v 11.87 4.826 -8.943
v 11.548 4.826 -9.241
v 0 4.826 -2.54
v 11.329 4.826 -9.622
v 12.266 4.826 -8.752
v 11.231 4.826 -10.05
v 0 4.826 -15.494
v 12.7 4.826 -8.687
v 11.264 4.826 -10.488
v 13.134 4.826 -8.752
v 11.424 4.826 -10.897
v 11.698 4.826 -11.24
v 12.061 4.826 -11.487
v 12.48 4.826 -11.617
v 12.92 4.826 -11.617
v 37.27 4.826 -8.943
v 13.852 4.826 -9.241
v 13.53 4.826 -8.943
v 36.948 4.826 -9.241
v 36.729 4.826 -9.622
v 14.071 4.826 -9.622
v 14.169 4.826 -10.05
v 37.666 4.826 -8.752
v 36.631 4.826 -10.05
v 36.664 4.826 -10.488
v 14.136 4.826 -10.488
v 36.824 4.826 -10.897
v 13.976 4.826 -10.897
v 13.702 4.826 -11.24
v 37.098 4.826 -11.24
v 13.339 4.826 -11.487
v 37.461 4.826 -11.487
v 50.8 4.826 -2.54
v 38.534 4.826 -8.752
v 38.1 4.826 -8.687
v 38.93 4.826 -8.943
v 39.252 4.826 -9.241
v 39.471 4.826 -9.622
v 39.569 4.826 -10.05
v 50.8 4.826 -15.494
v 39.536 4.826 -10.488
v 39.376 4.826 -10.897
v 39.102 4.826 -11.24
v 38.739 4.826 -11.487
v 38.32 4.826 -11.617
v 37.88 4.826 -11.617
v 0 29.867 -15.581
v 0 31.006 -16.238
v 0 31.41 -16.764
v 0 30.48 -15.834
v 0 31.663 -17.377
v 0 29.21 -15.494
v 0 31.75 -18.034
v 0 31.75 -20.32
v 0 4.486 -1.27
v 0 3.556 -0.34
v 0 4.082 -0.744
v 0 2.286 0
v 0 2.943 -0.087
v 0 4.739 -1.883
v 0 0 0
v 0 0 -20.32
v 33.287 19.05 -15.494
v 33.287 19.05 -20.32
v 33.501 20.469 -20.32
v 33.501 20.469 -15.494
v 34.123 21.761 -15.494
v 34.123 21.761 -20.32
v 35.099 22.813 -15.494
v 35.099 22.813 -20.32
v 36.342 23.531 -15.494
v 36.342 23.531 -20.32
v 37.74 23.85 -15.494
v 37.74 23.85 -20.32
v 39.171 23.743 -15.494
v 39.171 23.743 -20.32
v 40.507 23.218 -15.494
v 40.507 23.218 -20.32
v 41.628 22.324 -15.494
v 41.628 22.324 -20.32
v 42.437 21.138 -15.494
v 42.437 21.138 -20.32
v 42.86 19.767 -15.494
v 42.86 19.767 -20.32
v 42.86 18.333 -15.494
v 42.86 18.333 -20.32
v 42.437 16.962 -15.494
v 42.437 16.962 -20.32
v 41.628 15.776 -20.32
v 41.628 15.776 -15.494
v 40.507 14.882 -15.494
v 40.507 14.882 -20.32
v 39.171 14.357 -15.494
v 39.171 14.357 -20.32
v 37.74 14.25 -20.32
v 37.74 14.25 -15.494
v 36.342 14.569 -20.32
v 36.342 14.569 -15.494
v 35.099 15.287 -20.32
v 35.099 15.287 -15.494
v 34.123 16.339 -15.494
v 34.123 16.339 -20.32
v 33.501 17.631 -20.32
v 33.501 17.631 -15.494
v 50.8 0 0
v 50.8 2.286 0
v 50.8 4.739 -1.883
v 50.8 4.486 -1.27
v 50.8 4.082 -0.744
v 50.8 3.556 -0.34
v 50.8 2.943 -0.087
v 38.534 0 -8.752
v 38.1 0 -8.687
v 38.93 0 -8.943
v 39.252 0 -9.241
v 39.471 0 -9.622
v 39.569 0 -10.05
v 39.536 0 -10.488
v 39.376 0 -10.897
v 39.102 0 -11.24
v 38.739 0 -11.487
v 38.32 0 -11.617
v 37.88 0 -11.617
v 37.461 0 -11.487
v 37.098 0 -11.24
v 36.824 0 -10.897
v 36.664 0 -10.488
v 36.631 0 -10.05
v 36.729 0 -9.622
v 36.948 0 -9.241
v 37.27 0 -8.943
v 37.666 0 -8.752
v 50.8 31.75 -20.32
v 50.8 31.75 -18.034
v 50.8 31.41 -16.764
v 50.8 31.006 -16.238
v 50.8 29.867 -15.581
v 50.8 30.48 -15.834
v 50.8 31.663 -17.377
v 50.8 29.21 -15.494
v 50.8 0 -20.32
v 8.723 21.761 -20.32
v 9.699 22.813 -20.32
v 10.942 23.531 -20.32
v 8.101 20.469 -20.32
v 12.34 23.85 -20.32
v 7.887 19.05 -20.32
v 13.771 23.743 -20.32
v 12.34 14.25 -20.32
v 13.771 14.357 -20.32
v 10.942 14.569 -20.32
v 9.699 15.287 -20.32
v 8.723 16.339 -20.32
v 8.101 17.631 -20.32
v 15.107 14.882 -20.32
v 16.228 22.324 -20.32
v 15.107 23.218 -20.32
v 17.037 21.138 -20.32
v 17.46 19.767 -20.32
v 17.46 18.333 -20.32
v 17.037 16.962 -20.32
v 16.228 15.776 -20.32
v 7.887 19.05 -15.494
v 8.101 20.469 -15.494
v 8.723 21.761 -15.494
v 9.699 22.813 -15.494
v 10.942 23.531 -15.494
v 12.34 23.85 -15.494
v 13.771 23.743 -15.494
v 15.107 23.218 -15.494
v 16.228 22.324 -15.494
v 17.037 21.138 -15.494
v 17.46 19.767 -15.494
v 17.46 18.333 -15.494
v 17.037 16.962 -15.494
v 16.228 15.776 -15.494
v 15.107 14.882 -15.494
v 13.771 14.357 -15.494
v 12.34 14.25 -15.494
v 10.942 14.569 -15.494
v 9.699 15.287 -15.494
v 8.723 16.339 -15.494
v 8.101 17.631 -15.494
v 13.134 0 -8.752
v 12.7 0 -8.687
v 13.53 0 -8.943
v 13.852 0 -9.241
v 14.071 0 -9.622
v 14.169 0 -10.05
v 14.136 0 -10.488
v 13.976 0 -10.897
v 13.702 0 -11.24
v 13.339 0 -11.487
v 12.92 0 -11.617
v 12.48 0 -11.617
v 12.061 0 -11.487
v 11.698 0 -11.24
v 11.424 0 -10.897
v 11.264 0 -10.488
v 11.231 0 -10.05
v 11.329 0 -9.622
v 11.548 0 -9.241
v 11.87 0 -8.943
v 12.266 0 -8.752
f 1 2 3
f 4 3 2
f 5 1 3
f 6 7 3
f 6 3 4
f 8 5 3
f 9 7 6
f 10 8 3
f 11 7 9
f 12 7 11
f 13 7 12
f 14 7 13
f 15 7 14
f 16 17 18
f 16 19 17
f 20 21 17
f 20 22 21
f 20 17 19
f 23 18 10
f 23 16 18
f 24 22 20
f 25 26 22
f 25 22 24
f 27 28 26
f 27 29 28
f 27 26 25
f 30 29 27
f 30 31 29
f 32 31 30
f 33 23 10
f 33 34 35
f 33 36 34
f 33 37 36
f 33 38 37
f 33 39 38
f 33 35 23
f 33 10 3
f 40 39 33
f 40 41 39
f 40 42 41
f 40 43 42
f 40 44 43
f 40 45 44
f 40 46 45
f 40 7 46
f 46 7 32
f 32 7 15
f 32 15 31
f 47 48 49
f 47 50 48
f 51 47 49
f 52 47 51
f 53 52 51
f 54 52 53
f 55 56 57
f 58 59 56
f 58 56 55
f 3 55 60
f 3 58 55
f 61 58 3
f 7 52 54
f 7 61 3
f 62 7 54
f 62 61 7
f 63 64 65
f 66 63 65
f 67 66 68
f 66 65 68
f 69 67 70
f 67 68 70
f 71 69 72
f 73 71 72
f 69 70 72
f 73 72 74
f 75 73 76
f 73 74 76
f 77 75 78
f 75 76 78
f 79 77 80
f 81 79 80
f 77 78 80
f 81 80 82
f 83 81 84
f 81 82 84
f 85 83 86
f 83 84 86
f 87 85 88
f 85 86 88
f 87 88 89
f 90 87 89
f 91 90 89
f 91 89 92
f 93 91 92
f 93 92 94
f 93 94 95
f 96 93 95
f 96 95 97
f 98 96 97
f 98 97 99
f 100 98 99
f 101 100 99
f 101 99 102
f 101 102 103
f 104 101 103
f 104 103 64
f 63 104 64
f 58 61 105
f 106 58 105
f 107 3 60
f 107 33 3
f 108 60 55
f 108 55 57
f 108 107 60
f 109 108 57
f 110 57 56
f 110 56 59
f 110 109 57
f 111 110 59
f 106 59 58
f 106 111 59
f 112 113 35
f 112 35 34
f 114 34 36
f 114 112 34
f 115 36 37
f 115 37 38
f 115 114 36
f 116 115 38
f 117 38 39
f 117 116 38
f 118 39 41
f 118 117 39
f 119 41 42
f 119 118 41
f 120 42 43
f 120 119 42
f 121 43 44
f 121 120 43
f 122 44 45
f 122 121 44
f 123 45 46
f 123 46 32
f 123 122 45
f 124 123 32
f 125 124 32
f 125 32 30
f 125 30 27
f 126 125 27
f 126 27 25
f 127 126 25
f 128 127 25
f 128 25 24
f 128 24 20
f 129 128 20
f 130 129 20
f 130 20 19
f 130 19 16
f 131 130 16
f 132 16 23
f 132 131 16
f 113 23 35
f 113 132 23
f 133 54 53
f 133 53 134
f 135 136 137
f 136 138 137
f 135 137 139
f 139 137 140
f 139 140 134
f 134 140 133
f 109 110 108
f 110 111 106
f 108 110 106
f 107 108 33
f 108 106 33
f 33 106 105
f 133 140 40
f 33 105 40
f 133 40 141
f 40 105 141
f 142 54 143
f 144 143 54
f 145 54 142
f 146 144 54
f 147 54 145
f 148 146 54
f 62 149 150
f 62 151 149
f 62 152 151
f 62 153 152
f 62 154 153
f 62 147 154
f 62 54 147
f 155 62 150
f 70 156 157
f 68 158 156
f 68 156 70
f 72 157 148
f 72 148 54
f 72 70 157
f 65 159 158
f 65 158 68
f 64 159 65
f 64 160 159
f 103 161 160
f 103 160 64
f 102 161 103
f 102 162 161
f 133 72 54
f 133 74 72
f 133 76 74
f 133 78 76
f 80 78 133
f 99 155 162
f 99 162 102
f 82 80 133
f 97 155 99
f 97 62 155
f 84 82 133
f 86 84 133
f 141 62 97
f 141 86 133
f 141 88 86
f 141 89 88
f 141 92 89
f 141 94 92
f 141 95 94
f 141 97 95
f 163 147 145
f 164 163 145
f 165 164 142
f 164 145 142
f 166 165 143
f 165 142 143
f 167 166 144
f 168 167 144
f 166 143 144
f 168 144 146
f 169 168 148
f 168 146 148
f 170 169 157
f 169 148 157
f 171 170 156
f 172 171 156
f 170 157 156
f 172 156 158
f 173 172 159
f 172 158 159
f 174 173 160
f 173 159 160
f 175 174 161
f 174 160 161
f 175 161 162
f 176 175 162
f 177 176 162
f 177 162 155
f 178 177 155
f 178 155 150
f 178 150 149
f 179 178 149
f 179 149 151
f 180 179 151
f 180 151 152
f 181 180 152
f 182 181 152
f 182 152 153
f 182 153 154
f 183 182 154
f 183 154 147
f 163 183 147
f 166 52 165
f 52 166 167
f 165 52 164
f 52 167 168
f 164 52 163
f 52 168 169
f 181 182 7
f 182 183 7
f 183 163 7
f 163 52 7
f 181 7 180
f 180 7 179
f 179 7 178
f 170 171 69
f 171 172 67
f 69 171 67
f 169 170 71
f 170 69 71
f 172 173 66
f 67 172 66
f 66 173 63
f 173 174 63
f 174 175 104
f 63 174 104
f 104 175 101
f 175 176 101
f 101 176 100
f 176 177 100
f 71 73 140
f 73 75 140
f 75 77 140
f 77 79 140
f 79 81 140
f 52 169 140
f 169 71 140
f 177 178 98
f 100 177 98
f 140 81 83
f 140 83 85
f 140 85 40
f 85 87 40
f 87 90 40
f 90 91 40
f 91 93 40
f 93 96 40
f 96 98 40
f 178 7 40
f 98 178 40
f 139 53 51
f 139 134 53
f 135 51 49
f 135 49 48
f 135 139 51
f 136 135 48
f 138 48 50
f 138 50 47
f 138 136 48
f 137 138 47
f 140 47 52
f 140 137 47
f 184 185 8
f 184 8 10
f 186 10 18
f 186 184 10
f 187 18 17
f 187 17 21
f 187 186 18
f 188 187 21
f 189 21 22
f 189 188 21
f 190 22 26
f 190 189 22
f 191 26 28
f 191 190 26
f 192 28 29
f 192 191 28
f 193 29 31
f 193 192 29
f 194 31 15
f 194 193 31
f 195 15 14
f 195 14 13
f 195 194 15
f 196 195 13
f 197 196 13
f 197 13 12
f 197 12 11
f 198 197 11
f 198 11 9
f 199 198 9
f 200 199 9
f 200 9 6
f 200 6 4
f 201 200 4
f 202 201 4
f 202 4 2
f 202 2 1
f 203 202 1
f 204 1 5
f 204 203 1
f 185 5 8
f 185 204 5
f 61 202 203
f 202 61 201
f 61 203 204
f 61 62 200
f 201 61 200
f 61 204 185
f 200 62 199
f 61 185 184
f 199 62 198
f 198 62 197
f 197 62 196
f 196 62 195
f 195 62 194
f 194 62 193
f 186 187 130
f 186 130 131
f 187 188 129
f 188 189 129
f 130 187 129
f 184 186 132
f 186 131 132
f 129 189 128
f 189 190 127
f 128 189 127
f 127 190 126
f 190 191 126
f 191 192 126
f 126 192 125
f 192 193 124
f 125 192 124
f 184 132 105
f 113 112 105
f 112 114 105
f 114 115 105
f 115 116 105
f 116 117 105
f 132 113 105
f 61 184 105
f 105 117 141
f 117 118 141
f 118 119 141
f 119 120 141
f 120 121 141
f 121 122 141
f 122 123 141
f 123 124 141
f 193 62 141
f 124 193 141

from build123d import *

# Parameters (mm, degrees)
SKETCH1_W           = 50.8
SKETCH1_H           = 20.32
SKETCH1_R           = 1.4732
BOSS_EXTRUDE1_DEPTH = 4.826
SKETCH2_W           = 50.8
SKETCH2_H           = 4.826
BOSS_EXTRUDE2_DEPTH = 26.924
FILLET1_R           = 2.54
SKETCH3_R           = 4.8133
CUT_EXTRUDE1_DEPTH  = 26.924


with BuildPart() as part:
    # Sketch1 → Boss-Extrude1 (new body)
    with BuildSketch(Plane(origin=(0, 0, 0), x_dir=(1, 0, 0), z_dir=(0, 1, 0))):
        with Locations((25.4, 10.16)):
            Rectangle(SKETCH1_W, SKETCH1_H)
        with Locations(Location((12.7, 10.16, 0), (0, 0, 270))):
            Circle(SKETCH1_R, mode=Mode.SUBTRACT)
        with Locations(Location((38.1, 10.16, 0), (0, 0, 270))):
            Circle(SKETCH1_R, mode=Mode.SUBTRACT)
    extrude(amount=BOSS_EXTRUDE1_DEPTH)

    # Sketch2 → Boss-Extrude2 (add)
    with BuildSketch(Plane(origin=(0, 4.826, 0), x_dir=(1, 0, 0), z_dir=(0, 1, 0))):
        with Locations((25.4, 17.907)):
            Rectangle(SKETCH2_W, SKETCH2_H)
    extrude(amount=BOSS_EXTRUDE2_DEPTH)

    # Fillet1
    fillet1_edges = [part.edges().sort_by_distance(p)[0] for p in [
        (25.4, 31.75, -15.494),
        (25.4, 4.826, 0),
    ]]
    fillet(fillet1_edges, radius=FILLET1_R)

    # Sketch3 → Cut-Extrude1 (cut)
    with BuildSketch(Plane(origin=(0, 0, -20.32), x_dir=(-1, 0, 0), z_dir=(0, 0, -1))):
        with Locations((-38.1, 19.05)):
            Circle(SKETCH3_R)
        with Locations((-12.7, 19.05)):
            Circle(SKETCH3_R)
    extrude(amount=-CUT_EXTRUDE1_DEPTH, mode=Mode.SUBTRACT)


solid = part.part
